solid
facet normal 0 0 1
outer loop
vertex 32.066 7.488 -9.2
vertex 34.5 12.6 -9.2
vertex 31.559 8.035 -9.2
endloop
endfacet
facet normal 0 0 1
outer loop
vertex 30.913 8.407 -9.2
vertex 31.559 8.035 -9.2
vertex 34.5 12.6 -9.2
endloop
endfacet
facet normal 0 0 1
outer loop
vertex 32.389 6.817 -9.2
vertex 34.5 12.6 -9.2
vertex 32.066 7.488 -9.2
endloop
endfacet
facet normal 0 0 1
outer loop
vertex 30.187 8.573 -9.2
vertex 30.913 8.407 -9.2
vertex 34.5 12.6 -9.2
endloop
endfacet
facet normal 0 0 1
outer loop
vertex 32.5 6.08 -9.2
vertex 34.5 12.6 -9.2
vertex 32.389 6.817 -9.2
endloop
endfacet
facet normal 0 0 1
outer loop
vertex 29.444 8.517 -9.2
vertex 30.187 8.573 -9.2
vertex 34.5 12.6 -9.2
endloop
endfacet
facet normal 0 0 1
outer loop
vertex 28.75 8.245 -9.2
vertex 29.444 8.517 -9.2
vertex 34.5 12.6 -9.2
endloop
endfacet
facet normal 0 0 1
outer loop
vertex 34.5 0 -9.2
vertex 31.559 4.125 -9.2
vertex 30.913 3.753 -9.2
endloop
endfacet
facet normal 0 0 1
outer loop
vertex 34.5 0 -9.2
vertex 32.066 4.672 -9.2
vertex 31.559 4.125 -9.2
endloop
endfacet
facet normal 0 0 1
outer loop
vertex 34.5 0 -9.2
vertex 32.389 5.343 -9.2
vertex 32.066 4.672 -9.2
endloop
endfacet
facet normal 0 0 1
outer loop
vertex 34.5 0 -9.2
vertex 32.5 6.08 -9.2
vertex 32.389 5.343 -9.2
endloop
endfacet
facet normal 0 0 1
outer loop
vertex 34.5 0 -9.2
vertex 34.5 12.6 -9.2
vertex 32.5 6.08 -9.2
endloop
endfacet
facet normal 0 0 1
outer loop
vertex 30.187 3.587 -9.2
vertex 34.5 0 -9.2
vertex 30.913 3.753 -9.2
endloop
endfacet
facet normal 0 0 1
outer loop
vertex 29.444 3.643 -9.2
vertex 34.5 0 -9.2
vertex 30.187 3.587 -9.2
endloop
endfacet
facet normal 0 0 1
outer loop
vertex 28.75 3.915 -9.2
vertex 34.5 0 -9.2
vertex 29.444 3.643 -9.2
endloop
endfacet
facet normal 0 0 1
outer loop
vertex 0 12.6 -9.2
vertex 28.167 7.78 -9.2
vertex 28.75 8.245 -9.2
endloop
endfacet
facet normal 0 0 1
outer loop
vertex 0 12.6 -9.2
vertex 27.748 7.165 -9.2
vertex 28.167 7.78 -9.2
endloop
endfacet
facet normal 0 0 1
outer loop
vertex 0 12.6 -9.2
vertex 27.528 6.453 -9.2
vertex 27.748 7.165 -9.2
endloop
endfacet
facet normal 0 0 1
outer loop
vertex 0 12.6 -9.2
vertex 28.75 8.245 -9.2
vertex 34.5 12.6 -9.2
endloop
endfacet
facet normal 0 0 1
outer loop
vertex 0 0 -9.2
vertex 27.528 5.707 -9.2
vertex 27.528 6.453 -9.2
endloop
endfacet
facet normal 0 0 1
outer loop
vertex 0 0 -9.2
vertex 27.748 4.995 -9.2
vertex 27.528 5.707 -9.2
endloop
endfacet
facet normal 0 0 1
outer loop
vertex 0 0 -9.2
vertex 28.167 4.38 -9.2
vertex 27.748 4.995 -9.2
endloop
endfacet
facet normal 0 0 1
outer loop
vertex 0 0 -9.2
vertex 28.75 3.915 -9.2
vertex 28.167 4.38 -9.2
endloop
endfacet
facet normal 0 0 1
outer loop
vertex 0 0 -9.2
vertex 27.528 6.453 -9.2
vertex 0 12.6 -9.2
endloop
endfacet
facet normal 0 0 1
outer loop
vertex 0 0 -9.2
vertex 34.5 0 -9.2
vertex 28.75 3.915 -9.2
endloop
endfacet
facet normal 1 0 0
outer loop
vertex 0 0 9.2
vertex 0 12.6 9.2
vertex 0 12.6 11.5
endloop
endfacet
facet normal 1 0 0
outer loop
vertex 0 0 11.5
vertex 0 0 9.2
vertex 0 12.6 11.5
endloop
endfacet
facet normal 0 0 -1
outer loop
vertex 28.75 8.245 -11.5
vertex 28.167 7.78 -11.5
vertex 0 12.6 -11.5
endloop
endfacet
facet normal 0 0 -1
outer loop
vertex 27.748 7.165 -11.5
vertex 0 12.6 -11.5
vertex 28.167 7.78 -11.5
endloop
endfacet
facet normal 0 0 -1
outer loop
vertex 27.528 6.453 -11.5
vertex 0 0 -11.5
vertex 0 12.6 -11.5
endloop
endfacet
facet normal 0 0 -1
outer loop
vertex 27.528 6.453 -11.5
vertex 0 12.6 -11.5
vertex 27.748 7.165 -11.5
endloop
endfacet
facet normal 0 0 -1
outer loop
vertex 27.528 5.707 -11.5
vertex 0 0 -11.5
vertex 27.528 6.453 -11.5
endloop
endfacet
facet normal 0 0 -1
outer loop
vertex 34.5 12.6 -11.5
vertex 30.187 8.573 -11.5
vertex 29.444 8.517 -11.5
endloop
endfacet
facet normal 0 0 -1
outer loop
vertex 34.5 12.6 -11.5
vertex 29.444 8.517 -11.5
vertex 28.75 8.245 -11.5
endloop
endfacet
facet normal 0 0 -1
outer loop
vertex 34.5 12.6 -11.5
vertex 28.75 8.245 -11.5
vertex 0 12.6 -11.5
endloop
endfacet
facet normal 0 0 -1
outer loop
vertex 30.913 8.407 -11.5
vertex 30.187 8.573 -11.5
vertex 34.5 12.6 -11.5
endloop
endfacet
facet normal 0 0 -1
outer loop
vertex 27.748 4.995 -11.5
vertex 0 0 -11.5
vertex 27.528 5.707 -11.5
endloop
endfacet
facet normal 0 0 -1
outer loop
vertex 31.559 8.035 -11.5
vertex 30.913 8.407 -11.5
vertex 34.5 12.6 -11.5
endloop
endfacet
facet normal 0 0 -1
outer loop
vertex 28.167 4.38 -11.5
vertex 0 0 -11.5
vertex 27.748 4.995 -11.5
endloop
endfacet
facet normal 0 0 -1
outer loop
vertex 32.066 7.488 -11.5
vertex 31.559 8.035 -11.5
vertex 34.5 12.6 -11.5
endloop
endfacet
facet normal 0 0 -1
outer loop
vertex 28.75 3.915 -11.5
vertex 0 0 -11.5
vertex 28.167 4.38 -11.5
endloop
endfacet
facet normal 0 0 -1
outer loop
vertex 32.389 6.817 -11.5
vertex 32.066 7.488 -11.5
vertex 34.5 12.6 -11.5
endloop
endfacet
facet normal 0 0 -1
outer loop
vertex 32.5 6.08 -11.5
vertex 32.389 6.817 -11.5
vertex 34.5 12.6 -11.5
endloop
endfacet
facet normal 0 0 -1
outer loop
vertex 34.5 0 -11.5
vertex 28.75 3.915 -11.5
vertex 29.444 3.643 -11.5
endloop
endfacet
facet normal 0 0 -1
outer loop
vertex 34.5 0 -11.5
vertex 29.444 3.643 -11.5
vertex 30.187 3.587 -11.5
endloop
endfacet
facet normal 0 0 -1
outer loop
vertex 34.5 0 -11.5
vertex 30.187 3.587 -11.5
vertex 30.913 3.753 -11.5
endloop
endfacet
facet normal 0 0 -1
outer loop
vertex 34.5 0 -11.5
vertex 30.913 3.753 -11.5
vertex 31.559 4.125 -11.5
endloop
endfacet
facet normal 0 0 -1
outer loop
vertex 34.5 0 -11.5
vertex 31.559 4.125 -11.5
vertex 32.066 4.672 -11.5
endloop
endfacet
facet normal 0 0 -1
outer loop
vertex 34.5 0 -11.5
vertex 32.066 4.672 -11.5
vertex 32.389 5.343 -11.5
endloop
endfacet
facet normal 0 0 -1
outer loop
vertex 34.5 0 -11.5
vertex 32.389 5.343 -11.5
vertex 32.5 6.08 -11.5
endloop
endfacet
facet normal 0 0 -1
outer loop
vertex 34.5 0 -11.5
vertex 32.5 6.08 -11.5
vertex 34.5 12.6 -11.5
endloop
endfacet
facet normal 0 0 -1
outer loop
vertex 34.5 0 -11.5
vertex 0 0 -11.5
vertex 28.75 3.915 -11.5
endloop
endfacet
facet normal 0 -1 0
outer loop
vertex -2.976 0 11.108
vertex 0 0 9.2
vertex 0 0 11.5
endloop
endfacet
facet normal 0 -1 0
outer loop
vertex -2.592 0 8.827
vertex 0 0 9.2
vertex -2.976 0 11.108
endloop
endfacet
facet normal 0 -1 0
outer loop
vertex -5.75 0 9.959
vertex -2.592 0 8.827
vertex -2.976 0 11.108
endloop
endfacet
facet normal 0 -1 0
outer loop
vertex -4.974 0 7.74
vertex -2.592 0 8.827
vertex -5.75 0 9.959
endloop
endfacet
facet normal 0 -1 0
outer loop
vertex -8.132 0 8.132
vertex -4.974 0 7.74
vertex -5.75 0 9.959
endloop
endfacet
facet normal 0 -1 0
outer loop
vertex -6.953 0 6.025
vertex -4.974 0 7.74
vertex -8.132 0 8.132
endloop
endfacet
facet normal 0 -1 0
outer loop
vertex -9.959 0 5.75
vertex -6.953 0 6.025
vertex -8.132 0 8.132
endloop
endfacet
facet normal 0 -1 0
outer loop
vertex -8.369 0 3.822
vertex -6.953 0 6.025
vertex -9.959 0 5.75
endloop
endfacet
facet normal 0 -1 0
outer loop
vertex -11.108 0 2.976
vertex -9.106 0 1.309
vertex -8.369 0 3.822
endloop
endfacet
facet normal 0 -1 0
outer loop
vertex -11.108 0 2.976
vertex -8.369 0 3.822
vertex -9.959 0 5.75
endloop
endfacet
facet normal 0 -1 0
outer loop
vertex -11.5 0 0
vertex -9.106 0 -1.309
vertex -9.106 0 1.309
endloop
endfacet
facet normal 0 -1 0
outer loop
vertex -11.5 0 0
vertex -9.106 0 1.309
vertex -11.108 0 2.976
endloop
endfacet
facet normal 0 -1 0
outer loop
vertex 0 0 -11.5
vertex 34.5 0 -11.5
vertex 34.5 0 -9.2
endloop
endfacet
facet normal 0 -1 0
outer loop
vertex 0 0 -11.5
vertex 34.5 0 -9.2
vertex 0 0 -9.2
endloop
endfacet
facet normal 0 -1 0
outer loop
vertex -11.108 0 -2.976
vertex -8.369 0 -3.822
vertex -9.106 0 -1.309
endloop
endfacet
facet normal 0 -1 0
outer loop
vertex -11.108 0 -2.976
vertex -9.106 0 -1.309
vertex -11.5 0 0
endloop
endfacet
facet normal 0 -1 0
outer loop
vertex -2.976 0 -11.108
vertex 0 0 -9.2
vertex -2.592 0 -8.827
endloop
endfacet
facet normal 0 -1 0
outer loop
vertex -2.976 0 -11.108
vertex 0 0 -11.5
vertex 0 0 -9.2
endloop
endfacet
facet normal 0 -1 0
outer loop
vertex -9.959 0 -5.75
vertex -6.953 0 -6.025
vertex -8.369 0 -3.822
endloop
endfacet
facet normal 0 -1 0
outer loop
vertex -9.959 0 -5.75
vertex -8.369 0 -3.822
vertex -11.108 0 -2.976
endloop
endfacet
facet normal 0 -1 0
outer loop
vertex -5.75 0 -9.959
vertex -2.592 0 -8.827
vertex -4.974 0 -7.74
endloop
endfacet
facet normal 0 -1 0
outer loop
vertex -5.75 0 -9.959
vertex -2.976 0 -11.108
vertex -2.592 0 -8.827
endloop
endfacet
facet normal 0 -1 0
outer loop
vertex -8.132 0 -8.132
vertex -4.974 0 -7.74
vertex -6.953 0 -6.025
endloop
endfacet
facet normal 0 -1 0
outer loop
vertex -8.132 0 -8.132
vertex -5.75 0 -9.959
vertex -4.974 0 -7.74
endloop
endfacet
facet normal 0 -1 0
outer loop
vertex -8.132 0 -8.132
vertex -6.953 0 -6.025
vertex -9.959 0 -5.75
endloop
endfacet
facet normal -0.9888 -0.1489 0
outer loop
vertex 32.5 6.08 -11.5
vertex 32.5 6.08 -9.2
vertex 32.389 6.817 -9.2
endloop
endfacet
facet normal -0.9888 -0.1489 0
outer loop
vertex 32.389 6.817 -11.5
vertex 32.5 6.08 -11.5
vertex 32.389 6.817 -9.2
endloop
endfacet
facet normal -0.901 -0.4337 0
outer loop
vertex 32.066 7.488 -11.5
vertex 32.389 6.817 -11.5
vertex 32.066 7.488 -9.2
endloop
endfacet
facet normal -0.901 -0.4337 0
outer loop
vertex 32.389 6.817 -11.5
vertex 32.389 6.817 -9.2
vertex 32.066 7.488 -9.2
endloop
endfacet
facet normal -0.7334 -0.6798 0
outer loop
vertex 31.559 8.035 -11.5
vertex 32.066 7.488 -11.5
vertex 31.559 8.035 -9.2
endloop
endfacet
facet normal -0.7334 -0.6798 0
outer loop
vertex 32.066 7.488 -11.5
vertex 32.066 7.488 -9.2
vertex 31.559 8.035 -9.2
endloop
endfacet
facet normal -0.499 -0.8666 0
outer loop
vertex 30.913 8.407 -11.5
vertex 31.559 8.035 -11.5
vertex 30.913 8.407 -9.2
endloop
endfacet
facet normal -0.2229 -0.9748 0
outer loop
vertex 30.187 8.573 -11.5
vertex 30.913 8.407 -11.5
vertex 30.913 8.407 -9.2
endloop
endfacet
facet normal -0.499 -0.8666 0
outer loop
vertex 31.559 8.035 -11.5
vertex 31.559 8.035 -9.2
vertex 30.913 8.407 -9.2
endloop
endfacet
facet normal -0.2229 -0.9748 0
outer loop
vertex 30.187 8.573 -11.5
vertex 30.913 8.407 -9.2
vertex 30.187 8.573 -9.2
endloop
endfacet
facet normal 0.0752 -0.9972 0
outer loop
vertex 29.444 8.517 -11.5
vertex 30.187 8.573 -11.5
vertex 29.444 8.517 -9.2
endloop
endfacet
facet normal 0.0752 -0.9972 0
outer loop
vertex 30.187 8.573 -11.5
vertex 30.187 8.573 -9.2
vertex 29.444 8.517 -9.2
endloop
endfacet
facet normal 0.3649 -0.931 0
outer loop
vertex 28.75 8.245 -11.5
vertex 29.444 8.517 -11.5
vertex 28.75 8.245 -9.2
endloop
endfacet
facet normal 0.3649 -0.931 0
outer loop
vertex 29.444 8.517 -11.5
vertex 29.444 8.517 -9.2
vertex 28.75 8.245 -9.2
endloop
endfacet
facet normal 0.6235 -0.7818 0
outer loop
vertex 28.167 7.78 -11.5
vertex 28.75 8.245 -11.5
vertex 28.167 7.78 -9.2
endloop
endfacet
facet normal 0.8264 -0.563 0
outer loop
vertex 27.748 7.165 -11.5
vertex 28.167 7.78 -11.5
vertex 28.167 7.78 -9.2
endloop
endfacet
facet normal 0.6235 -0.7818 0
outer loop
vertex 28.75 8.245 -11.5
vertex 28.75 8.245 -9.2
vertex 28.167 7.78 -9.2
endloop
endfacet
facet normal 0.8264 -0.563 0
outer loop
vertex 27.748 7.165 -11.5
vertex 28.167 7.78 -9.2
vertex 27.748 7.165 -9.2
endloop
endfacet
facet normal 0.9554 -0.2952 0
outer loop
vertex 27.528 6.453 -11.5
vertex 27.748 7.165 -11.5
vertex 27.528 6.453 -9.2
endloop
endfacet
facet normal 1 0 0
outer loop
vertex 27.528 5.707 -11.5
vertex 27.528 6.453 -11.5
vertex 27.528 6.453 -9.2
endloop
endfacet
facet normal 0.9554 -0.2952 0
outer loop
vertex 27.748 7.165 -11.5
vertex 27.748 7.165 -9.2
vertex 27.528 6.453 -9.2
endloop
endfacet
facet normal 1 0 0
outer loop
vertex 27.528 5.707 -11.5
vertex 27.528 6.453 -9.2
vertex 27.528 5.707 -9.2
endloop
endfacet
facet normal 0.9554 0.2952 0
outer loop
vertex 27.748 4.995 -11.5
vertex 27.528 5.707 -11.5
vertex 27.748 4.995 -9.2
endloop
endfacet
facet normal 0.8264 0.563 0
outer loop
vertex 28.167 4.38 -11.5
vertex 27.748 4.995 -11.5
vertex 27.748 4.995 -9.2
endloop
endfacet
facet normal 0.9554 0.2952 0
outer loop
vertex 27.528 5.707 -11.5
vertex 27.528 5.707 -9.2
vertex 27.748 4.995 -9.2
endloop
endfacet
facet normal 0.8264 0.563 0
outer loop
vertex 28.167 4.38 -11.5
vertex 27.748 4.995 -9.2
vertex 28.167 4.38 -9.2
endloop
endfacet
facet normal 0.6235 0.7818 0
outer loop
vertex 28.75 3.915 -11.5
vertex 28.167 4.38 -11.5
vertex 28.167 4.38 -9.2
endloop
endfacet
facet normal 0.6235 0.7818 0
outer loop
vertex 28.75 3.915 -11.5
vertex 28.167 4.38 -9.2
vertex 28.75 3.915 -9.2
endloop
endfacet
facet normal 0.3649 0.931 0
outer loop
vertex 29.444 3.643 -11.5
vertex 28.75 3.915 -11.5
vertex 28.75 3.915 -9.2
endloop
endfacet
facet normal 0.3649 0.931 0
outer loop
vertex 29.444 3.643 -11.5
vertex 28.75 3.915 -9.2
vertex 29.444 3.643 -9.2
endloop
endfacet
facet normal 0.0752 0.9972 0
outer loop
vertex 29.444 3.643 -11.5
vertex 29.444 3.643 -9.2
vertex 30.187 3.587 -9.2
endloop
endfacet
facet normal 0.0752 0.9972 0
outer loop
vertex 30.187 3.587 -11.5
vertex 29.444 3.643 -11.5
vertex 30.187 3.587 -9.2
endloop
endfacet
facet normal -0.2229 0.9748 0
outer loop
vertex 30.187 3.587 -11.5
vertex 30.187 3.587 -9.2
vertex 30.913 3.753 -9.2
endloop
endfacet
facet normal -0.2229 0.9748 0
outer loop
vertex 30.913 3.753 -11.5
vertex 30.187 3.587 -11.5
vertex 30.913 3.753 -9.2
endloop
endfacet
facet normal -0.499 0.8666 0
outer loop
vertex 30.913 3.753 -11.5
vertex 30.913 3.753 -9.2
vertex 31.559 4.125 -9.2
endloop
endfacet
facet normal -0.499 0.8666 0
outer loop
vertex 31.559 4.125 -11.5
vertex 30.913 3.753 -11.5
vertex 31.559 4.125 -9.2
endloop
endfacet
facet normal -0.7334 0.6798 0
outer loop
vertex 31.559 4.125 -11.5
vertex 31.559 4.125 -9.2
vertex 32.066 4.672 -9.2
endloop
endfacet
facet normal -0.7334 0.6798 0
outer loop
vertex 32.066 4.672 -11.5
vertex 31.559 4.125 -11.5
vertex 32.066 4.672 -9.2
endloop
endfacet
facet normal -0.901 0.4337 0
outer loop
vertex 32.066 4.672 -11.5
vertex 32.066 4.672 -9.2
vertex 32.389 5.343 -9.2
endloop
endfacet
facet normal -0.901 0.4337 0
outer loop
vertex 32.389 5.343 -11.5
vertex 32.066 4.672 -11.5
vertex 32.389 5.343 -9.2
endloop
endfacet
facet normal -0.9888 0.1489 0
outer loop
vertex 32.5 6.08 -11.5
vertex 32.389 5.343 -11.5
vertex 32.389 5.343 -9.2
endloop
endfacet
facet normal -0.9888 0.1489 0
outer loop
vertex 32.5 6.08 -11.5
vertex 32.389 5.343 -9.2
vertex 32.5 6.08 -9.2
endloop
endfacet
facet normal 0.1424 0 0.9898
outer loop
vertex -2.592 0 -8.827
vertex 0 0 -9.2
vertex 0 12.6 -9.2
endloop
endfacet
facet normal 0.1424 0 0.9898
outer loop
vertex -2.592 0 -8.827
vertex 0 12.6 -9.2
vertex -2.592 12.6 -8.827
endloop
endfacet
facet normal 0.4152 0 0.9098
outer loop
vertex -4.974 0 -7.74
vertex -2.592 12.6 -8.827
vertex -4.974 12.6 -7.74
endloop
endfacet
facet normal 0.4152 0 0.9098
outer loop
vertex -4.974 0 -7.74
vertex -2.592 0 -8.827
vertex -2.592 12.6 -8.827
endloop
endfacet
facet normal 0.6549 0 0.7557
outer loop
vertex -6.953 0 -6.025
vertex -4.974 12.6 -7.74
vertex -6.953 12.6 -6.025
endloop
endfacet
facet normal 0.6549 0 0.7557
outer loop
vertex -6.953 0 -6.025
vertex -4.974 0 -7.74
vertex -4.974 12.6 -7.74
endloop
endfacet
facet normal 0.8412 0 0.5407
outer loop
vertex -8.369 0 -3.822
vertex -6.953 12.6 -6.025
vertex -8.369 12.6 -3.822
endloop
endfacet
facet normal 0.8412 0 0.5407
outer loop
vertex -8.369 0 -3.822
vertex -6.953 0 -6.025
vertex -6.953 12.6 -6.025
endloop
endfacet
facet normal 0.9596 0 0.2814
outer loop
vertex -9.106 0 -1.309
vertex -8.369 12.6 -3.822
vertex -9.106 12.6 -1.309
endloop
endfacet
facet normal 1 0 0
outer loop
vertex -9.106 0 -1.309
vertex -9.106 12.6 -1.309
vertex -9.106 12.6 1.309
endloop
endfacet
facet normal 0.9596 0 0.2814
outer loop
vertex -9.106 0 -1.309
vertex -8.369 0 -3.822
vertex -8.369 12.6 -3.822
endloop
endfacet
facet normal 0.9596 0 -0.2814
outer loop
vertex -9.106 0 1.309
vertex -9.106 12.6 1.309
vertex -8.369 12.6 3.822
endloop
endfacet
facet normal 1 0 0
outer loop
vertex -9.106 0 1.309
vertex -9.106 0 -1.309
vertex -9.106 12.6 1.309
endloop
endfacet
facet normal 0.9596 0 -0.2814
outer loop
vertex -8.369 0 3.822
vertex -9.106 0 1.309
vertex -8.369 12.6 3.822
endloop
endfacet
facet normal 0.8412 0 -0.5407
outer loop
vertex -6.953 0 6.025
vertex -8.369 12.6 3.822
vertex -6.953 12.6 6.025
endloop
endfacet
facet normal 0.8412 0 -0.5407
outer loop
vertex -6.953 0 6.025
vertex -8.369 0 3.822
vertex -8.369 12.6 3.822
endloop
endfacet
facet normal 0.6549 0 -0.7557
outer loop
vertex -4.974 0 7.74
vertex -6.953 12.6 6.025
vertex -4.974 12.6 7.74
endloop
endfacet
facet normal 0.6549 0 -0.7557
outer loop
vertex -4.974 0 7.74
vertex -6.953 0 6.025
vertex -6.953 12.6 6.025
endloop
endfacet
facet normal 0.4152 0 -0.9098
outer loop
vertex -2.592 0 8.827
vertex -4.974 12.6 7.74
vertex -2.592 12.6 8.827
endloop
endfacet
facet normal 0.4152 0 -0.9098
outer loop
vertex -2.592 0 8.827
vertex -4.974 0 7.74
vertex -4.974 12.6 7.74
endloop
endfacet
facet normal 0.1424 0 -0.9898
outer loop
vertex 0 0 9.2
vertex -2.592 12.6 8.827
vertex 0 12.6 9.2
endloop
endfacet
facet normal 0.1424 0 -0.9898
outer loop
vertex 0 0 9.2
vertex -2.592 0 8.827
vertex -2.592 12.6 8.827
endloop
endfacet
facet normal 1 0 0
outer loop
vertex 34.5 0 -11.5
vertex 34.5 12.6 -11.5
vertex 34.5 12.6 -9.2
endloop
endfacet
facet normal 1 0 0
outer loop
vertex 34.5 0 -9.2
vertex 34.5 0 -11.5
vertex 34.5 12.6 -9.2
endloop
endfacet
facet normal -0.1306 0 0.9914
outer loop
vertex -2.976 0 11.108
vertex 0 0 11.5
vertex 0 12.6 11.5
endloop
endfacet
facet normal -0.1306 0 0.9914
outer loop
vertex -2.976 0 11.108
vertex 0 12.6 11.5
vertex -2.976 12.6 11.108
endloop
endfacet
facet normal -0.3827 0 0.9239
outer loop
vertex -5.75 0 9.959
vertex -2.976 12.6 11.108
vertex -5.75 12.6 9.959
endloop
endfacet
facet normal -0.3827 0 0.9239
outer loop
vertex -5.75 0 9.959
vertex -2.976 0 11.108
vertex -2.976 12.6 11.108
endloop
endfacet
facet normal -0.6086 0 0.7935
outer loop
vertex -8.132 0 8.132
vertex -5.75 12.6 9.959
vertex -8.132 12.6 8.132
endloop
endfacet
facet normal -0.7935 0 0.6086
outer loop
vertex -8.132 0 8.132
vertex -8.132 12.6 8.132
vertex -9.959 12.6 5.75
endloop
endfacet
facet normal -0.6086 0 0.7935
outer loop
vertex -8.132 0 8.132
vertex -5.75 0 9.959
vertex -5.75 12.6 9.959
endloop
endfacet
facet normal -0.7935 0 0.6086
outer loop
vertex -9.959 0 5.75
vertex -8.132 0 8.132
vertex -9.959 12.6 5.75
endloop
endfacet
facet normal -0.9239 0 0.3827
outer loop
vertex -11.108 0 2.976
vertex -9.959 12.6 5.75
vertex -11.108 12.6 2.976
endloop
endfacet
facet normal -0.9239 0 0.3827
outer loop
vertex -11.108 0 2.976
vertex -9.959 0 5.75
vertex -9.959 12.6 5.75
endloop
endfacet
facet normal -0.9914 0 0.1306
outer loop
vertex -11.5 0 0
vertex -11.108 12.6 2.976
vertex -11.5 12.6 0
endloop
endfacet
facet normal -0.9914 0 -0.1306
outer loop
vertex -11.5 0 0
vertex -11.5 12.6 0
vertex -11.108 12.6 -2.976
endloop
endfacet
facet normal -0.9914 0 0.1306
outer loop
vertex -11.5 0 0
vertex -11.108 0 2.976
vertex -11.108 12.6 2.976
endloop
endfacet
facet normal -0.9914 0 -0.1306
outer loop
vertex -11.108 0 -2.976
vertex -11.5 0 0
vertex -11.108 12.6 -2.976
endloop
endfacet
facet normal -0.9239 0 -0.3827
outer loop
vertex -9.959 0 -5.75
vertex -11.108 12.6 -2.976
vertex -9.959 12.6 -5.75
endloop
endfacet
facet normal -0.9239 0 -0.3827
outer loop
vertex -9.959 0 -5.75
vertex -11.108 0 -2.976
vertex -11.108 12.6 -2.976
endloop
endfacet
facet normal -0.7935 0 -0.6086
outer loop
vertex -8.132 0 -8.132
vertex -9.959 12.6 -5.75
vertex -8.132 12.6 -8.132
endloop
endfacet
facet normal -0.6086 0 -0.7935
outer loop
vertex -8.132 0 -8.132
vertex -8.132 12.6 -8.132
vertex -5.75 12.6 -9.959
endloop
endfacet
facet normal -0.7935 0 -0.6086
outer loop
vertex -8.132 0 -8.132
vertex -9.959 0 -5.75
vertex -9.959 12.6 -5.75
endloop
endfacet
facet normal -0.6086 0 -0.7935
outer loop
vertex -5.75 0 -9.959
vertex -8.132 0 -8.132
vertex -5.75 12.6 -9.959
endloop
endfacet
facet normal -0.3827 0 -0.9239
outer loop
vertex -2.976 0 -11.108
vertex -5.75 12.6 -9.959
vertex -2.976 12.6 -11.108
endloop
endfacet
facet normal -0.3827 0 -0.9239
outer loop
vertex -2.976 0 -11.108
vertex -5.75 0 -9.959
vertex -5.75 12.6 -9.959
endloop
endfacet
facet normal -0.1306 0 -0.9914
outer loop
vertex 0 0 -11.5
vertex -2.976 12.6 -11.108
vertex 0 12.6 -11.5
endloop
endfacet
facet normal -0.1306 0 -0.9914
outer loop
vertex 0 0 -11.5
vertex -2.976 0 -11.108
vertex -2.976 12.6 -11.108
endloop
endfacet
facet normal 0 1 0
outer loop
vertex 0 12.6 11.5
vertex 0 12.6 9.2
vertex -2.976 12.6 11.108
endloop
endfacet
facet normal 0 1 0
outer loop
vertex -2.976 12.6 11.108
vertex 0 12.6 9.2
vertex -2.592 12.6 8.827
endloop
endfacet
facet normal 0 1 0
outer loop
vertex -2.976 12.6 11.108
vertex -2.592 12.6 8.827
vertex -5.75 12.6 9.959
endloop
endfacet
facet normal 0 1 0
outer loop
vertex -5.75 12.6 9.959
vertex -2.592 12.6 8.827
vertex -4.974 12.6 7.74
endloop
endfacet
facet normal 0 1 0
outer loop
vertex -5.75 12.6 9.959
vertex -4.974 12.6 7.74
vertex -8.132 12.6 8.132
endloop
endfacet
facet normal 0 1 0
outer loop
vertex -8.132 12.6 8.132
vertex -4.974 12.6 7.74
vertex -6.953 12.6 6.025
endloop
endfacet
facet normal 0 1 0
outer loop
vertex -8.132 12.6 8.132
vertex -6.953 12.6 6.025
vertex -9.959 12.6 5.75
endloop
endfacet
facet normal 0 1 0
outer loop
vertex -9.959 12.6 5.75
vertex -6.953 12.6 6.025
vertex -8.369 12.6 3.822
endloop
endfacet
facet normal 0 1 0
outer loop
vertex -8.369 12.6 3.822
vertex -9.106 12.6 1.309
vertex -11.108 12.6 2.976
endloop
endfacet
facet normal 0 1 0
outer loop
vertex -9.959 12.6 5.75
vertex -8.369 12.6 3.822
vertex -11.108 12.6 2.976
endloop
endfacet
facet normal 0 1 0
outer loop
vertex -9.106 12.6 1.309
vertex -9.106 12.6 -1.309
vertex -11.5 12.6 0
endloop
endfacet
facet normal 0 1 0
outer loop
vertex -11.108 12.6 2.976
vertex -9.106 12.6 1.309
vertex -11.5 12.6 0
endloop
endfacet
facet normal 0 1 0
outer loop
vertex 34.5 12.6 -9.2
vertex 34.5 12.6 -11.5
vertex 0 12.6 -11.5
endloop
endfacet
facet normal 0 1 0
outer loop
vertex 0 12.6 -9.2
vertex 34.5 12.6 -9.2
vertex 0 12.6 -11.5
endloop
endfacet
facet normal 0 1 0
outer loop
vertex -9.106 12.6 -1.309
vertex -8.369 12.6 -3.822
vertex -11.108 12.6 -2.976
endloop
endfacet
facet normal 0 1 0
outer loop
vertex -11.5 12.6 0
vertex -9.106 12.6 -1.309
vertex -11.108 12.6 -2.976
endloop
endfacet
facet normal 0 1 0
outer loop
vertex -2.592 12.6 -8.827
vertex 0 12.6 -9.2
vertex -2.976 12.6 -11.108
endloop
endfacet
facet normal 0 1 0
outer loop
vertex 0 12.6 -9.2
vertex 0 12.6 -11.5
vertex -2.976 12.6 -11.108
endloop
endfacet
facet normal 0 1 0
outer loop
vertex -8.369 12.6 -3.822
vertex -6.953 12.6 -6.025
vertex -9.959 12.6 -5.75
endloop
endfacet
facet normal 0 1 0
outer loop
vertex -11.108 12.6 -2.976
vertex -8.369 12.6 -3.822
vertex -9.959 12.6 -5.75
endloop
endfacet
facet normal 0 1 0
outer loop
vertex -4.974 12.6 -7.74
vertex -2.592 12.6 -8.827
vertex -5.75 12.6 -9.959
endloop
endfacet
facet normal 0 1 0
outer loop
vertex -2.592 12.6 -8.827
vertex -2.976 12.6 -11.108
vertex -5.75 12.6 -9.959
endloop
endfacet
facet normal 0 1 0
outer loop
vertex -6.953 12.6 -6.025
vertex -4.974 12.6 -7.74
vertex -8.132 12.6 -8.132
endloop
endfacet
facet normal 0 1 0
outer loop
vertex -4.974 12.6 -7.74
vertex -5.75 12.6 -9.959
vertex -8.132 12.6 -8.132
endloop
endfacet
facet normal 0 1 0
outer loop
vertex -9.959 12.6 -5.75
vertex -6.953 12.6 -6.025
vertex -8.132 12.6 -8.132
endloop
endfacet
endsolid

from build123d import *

# Parameters (mm, degrees)
BOSS_EXTRUDE1_DEPTH = 12.6
SKETCH2_R           = 2.5
CUT_EXTRUDE1_DEPTH  = 12.6


with BuildPart() as part:
    # Sketch1 → Boss-Extrude1 (new body)
    with BuildSketch(Plane(origin=(0, 0, 0), x_dir=(1, 0, 0), z_dir=(0, 1, 0))):
        with BuildLine():
            Line((0, 11.5), (11.5, 11.5))
            Line((11.5, 11.5), (34.5, 11.5))
            Line((34.5, 11.5), (34.5, 9.2))
            Line((34.5, 9.2), (0, 9.2))
            ThreePointArc((0, 9.2), (-9.2, 0), (0, -9.2))
            Line((0, -9.2), (0, -11.5))
            ThreePointArc((0, -11.5), (-11.5, 0), (0, 11.5))
        make_face()
    extrude(amount=BOSS_EXTRUDE1_DEPTH)

    # Sketch2 → Cut-Extrude1 (cut)
    with BuildSketch(Plane.XY.offset(-9.2)):
        with Locations((30, 6.079989629)):
            Circle(SKETCH2_R)
    extrude(amount=-CUT_EXTRUDE1_DEPTH, mode=Mode.SUBTRACT)


solid = part.part
